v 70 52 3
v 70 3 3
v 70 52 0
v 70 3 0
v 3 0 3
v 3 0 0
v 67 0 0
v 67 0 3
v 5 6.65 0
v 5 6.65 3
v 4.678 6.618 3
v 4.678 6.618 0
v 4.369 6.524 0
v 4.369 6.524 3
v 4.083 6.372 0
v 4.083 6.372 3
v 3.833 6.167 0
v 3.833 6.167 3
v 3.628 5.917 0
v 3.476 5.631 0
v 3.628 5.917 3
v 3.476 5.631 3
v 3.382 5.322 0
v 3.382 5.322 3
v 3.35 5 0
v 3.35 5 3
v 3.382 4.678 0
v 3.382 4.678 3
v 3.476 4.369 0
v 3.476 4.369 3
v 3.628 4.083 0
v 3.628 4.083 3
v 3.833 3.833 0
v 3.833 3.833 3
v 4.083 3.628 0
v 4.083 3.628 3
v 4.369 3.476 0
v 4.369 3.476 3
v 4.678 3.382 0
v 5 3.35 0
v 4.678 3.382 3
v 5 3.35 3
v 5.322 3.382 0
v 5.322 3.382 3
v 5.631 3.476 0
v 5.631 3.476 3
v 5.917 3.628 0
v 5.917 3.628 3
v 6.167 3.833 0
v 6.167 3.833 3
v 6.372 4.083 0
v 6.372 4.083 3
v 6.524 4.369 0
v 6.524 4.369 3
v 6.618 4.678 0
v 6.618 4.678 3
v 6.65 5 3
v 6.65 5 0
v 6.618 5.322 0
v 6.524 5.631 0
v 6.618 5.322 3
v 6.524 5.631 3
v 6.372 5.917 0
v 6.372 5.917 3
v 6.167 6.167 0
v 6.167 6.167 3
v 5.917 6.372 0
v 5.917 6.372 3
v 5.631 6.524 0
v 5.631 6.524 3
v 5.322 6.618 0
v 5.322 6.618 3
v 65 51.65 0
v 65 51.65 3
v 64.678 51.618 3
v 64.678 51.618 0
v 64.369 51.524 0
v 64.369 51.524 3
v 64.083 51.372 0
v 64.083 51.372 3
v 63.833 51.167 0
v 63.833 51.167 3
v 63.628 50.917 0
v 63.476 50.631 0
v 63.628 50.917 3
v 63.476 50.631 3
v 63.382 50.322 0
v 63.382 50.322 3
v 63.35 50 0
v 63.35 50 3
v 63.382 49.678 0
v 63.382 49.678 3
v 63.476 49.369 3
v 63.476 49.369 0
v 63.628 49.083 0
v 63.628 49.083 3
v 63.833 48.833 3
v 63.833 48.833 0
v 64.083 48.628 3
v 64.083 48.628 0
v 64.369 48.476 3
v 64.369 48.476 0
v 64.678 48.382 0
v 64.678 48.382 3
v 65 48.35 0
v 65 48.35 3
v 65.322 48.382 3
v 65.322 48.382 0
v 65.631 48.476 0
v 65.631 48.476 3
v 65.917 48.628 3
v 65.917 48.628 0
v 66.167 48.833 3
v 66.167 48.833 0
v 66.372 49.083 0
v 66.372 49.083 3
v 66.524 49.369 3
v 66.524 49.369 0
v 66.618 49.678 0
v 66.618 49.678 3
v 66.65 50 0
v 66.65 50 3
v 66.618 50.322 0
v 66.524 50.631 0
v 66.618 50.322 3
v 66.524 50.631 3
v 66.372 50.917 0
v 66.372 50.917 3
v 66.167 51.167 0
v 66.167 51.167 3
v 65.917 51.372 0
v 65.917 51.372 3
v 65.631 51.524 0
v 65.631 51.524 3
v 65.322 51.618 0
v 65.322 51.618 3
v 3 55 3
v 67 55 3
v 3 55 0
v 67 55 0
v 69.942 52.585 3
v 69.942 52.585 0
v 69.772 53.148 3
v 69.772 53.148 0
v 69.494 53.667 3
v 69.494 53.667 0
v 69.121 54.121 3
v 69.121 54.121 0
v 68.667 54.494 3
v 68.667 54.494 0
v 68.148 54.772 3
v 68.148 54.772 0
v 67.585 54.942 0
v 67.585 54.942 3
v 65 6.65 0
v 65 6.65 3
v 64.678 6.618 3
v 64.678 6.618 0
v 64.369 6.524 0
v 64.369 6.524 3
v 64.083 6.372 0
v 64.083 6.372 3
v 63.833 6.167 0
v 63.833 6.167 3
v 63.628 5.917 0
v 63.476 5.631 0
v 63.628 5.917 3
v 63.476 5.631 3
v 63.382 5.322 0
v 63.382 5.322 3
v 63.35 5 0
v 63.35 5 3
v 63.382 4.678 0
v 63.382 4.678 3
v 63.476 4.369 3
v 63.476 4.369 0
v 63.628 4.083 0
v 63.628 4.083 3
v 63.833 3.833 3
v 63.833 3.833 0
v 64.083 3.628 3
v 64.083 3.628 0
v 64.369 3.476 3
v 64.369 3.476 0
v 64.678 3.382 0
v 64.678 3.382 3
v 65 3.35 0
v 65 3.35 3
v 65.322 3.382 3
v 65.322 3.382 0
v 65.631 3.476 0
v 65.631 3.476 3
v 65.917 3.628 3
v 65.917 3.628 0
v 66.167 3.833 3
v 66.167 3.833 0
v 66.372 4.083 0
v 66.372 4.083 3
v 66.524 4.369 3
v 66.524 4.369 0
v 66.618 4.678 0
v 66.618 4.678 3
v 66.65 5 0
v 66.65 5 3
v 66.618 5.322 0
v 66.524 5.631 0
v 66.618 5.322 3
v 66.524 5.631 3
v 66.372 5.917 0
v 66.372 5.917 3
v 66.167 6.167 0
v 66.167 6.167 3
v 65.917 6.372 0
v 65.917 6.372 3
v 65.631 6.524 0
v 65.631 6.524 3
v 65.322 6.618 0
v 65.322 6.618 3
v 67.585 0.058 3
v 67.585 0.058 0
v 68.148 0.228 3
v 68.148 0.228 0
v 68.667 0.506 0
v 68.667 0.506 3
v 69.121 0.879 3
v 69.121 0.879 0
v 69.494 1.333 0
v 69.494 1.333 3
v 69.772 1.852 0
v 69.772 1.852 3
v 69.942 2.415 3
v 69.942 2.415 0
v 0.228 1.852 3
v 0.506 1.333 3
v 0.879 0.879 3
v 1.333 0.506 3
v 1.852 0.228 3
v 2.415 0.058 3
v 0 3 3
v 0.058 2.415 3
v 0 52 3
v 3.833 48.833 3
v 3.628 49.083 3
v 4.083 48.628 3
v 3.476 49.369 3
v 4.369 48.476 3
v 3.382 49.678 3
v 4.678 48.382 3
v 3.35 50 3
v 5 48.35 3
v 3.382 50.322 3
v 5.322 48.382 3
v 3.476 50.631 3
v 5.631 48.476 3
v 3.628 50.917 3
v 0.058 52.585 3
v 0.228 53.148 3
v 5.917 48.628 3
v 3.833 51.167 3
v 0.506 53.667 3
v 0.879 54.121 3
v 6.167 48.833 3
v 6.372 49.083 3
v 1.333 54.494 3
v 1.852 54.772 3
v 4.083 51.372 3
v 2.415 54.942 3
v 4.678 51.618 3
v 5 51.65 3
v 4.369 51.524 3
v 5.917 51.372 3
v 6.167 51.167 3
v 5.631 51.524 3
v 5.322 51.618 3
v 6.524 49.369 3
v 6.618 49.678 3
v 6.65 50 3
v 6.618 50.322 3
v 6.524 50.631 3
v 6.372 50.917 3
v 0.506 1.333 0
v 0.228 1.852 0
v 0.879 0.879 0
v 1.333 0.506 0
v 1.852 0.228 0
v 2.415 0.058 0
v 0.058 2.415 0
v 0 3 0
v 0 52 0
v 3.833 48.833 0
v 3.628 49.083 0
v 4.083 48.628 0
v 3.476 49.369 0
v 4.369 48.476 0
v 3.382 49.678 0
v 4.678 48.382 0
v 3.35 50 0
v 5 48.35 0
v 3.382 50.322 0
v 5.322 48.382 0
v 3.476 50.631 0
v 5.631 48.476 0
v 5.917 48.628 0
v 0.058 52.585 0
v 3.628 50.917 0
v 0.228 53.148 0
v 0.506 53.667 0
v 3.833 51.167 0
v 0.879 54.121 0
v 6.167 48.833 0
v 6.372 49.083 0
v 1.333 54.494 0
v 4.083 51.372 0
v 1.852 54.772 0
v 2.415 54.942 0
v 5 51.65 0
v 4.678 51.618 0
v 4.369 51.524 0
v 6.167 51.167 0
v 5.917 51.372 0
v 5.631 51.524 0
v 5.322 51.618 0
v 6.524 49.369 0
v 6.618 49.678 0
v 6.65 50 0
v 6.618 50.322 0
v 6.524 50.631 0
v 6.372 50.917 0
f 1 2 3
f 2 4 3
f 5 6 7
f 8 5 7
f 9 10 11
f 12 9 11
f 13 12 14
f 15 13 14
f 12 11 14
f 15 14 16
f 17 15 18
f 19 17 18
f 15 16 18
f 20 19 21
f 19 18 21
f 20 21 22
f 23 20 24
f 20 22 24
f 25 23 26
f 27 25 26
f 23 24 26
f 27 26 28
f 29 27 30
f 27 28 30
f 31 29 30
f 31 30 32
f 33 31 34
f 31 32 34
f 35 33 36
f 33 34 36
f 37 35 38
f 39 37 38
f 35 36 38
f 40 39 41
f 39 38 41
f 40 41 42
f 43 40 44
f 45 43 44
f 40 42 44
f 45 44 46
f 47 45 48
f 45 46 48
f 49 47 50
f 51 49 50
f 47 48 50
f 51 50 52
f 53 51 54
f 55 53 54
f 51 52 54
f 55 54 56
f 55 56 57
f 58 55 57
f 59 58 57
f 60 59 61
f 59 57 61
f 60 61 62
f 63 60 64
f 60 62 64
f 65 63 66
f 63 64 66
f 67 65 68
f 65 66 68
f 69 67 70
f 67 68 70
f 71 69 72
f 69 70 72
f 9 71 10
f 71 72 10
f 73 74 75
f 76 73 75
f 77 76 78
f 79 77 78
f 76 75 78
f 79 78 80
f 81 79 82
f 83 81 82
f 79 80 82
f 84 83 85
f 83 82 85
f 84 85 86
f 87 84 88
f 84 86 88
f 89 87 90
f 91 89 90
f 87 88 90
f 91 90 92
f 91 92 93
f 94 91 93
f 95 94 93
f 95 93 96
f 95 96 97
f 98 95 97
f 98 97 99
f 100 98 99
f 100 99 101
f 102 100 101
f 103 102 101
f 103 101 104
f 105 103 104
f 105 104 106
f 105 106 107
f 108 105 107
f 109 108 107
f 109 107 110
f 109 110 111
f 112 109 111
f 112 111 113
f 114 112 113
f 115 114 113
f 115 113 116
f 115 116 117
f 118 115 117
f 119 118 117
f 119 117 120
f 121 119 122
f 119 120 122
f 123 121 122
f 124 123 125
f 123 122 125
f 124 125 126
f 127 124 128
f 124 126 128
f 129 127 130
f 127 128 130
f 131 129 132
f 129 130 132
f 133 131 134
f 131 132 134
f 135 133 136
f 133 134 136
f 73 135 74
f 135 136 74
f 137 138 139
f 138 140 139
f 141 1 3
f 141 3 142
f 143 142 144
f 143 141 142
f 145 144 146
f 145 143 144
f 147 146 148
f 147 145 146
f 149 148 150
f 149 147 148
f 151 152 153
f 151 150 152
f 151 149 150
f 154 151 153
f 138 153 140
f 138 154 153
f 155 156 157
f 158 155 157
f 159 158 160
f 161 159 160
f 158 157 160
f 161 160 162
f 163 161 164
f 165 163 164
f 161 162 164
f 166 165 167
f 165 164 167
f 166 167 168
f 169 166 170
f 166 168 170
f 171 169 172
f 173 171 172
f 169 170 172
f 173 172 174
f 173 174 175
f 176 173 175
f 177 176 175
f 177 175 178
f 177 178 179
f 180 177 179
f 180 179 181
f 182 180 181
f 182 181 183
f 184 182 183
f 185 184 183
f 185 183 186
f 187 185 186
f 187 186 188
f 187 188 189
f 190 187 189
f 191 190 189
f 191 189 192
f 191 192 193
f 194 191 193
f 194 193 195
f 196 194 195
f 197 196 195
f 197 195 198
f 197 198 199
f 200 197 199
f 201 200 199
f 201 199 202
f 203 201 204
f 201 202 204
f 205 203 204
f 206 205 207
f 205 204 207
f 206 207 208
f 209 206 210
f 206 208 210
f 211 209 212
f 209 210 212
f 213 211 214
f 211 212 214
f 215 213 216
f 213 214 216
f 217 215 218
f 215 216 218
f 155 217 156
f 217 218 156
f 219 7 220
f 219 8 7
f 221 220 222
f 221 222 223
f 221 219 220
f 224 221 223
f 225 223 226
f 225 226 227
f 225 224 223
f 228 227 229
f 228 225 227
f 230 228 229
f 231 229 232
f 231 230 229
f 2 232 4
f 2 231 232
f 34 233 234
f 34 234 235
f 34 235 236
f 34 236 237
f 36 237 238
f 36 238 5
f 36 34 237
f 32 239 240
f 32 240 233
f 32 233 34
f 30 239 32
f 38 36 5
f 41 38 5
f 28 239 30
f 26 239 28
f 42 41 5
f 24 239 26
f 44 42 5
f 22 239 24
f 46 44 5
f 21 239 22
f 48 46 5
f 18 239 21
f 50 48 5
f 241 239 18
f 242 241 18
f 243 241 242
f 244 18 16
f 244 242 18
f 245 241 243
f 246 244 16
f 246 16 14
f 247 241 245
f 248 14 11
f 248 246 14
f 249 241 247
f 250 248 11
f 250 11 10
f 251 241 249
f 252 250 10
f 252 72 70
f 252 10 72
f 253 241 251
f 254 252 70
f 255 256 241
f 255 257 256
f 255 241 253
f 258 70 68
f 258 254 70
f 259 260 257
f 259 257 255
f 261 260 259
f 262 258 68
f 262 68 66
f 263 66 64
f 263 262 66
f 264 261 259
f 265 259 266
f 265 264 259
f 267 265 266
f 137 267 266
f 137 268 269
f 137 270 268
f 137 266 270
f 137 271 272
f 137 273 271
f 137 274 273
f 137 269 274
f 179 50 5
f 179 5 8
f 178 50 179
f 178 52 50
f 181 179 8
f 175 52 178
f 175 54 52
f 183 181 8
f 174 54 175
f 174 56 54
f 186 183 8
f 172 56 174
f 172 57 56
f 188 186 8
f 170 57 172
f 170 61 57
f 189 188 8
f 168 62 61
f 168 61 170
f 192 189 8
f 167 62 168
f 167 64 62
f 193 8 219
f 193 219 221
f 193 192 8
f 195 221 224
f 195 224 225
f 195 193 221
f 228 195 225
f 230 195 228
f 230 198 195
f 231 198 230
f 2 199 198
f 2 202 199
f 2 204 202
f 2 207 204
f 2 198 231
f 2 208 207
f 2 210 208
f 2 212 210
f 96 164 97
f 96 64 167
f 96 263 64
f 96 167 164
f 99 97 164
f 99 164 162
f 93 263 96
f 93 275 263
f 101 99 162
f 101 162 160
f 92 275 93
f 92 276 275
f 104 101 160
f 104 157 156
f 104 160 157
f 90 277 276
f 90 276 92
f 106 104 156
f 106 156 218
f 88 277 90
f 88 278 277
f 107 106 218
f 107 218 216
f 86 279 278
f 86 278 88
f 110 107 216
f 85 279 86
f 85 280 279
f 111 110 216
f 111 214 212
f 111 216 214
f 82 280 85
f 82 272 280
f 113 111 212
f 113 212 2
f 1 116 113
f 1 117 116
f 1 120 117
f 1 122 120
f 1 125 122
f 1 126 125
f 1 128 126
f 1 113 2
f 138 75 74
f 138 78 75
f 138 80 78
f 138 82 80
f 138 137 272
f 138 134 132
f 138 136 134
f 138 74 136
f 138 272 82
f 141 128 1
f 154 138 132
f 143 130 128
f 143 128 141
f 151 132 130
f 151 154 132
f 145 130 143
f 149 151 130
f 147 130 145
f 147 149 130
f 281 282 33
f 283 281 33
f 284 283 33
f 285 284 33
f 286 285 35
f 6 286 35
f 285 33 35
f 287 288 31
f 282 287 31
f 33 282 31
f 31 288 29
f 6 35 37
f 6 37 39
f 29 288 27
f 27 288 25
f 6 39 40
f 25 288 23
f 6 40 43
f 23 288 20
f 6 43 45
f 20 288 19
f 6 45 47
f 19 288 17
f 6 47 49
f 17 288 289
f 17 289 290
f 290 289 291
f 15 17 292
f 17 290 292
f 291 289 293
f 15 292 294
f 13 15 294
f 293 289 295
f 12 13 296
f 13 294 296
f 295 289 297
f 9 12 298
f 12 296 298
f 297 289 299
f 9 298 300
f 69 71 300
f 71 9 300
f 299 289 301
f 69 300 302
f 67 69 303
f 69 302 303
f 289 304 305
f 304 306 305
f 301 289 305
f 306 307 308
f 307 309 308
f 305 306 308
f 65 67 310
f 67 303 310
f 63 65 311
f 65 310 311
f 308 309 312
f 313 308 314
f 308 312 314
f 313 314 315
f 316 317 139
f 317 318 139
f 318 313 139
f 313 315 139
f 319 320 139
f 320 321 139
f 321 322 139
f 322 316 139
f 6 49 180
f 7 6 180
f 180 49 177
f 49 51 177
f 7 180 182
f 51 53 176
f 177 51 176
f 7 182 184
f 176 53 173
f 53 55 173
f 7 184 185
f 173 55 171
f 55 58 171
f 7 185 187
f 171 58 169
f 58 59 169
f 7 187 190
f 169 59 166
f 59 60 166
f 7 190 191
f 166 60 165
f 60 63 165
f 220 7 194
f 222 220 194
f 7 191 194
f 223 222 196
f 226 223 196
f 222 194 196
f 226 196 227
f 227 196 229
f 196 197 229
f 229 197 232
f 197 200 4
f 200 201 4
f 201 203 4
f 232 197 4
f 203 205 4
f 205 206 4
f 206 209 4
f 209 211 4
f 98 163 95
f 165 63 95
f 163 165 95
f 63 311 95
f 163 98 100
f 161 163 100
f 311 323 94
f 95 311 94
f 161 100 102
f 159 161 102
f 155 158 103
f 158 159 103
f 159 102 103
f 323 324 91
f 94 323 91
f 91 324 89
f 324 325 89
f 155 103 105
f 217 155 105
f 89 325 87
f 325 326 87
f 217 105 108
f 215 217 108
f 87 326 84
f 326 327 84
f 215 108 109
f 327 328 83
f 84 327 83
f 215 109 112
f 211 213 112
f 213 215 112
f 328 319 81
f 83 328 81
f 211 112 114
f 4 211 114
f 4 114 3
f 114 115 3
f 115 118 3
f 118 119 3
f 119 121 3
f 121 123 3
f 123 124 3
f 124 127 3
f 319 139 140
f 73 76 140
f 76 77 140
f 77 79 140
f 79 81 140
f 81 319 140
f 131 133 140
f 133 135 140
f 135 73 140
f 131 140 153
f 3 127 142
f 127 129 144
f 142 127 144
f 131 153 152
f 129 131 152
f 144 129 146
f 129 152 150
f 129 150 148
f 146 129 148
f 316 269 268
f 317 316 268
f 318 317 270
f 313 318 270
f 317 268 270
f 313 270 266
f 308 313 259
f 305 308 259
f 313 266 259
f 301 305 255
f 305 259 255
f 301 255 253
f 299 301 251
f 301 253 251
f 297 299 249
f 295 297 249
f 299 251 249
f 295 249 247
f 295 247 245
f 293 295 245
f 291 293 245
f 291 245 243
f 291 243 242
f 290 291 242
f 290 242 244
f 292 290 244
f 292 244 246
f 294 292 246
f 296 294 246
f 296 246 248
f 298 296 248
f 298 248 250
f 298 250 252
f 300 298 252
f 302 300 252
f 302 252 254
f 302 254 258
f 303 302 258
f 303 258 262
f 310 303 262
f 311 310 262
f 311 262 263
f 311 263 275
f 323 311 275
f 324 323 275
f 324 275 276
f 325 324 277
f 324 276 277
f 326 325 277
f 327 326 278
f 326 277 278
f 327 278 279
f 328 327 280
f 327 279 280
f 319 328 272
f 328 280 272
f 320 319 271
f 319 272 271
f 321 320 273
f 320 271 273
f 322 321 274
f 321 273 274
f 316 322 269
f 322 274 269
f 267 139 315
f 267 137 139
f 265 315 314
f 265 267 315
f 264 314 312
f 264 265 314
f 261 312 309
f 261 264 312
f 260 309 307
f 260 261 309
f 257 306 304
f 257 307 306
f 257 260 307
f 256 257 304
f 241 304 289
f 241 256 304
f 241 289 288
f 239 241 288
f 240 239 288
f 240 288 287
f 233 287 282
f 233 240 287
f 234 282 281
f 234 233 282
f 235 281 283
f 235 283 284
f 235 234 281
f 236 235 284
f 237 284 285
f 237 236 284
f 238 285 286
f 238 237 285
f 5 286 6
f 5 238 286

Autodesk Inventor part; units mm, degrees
ref_plane "YZ Plane" through (0, 0, 0) normal (1, 0, 0) x (0, 1, 0)
ref_plane "XZ Plane" through (0, 0, 0) normal (0, 1, 0) x (-1, 0, 0)
ref_plane "XY Plane" through (0, 0, 0) normal (0, 0, 1) x (1, 0, 0)
sketch "Sketch1" plane through (0, 0, 0) normal (0, 0, 1) x (1, 0, 0)
  line L0 (0, 0) -> (70, 0)
  line L1 (70, 0) -> (70, 55)
  line L2 (70, 55) -> (0, 55)
  line L3 (0, 55) -> (0, 0)
  point P0 (5, 50)
  point P1 (65, 50)
  point P2 (65, 5)
  point P3 (5, 5)
  dimension "d0" = 70
  dimension "d1" = 55
  dimension "d13" = 5
  dimension "d14" = 5
  dimension "d18" = 60
  dimension "d19" = 45
extrude "Extrusion1" add sketch "Sketch1" along normal blind 3
sketch "Sketch3" plane through (0, 0, 0) normal (0, 0, 1) x (1, 0, 0)
  line L0 (0, 0) -> (70, 0)
  line L1 (70, 0) -> (70, 55)
  line L2 (70, 55) -> (0, 55)
  line L3 (0, 55) -> (0, 0)
  point P0 (5, 50)
  point P1 (65, 50)
  point P2 (65, 5)
  point P3 (5, 5)
  dimension "d20" = 70
  dimension "d21" = 55
  dimension "d22" = 5
  dimension "d23" = 5
  dimension "d24" = 60
  dimension "d25" = 45
hole "Hole1" at (5, 50, 0) at (65, 50, 0) at (65, 5, 0) at (5, 5, 0) direction (0, 0, 1) diameter 3.3 end through all
fillet "Fillet1" radius 3 4 edges at (70, 55, 1.5) (70, 0, 1.5) (0, 0, 1.5) (0, 55, 1.5)
sketch "Sketch4" plane through (0, 0, 3) normal (0, 0, 1) x (1, 0, 0)
  arc A0 (3, 55) -> (0, 52) centre (3, 52) ccw projected
  line L0 (0, 52) -> (0, 3) projected
  arc A1 (0, 3) -> (3, 0) centre (3, 3) ccw projected
  line L1 (3, 0) -> (67, 0) projected
  arc A2 (67, 0) -> (70, 3) centre (67, 3) ccw projected
  line L2 (70, 3) -> (70, 52) projected
  arc A3 (70, 52) -> (67, 55) centre (67, 52) ccw projected
  line L3 (67, 55) -> (3, 55) projected
  circle A4 centre (65, 5) radius 1.65 projected
  circle A5 centre (5, 50) radius 1.65 projected
  circle A6 centre (65, 50) radius 1.65 projected
  circle A7 centre (5, 5) radius 1.65 projected
  point P0 (0, 0)
properties part number "BasePixhawk"
